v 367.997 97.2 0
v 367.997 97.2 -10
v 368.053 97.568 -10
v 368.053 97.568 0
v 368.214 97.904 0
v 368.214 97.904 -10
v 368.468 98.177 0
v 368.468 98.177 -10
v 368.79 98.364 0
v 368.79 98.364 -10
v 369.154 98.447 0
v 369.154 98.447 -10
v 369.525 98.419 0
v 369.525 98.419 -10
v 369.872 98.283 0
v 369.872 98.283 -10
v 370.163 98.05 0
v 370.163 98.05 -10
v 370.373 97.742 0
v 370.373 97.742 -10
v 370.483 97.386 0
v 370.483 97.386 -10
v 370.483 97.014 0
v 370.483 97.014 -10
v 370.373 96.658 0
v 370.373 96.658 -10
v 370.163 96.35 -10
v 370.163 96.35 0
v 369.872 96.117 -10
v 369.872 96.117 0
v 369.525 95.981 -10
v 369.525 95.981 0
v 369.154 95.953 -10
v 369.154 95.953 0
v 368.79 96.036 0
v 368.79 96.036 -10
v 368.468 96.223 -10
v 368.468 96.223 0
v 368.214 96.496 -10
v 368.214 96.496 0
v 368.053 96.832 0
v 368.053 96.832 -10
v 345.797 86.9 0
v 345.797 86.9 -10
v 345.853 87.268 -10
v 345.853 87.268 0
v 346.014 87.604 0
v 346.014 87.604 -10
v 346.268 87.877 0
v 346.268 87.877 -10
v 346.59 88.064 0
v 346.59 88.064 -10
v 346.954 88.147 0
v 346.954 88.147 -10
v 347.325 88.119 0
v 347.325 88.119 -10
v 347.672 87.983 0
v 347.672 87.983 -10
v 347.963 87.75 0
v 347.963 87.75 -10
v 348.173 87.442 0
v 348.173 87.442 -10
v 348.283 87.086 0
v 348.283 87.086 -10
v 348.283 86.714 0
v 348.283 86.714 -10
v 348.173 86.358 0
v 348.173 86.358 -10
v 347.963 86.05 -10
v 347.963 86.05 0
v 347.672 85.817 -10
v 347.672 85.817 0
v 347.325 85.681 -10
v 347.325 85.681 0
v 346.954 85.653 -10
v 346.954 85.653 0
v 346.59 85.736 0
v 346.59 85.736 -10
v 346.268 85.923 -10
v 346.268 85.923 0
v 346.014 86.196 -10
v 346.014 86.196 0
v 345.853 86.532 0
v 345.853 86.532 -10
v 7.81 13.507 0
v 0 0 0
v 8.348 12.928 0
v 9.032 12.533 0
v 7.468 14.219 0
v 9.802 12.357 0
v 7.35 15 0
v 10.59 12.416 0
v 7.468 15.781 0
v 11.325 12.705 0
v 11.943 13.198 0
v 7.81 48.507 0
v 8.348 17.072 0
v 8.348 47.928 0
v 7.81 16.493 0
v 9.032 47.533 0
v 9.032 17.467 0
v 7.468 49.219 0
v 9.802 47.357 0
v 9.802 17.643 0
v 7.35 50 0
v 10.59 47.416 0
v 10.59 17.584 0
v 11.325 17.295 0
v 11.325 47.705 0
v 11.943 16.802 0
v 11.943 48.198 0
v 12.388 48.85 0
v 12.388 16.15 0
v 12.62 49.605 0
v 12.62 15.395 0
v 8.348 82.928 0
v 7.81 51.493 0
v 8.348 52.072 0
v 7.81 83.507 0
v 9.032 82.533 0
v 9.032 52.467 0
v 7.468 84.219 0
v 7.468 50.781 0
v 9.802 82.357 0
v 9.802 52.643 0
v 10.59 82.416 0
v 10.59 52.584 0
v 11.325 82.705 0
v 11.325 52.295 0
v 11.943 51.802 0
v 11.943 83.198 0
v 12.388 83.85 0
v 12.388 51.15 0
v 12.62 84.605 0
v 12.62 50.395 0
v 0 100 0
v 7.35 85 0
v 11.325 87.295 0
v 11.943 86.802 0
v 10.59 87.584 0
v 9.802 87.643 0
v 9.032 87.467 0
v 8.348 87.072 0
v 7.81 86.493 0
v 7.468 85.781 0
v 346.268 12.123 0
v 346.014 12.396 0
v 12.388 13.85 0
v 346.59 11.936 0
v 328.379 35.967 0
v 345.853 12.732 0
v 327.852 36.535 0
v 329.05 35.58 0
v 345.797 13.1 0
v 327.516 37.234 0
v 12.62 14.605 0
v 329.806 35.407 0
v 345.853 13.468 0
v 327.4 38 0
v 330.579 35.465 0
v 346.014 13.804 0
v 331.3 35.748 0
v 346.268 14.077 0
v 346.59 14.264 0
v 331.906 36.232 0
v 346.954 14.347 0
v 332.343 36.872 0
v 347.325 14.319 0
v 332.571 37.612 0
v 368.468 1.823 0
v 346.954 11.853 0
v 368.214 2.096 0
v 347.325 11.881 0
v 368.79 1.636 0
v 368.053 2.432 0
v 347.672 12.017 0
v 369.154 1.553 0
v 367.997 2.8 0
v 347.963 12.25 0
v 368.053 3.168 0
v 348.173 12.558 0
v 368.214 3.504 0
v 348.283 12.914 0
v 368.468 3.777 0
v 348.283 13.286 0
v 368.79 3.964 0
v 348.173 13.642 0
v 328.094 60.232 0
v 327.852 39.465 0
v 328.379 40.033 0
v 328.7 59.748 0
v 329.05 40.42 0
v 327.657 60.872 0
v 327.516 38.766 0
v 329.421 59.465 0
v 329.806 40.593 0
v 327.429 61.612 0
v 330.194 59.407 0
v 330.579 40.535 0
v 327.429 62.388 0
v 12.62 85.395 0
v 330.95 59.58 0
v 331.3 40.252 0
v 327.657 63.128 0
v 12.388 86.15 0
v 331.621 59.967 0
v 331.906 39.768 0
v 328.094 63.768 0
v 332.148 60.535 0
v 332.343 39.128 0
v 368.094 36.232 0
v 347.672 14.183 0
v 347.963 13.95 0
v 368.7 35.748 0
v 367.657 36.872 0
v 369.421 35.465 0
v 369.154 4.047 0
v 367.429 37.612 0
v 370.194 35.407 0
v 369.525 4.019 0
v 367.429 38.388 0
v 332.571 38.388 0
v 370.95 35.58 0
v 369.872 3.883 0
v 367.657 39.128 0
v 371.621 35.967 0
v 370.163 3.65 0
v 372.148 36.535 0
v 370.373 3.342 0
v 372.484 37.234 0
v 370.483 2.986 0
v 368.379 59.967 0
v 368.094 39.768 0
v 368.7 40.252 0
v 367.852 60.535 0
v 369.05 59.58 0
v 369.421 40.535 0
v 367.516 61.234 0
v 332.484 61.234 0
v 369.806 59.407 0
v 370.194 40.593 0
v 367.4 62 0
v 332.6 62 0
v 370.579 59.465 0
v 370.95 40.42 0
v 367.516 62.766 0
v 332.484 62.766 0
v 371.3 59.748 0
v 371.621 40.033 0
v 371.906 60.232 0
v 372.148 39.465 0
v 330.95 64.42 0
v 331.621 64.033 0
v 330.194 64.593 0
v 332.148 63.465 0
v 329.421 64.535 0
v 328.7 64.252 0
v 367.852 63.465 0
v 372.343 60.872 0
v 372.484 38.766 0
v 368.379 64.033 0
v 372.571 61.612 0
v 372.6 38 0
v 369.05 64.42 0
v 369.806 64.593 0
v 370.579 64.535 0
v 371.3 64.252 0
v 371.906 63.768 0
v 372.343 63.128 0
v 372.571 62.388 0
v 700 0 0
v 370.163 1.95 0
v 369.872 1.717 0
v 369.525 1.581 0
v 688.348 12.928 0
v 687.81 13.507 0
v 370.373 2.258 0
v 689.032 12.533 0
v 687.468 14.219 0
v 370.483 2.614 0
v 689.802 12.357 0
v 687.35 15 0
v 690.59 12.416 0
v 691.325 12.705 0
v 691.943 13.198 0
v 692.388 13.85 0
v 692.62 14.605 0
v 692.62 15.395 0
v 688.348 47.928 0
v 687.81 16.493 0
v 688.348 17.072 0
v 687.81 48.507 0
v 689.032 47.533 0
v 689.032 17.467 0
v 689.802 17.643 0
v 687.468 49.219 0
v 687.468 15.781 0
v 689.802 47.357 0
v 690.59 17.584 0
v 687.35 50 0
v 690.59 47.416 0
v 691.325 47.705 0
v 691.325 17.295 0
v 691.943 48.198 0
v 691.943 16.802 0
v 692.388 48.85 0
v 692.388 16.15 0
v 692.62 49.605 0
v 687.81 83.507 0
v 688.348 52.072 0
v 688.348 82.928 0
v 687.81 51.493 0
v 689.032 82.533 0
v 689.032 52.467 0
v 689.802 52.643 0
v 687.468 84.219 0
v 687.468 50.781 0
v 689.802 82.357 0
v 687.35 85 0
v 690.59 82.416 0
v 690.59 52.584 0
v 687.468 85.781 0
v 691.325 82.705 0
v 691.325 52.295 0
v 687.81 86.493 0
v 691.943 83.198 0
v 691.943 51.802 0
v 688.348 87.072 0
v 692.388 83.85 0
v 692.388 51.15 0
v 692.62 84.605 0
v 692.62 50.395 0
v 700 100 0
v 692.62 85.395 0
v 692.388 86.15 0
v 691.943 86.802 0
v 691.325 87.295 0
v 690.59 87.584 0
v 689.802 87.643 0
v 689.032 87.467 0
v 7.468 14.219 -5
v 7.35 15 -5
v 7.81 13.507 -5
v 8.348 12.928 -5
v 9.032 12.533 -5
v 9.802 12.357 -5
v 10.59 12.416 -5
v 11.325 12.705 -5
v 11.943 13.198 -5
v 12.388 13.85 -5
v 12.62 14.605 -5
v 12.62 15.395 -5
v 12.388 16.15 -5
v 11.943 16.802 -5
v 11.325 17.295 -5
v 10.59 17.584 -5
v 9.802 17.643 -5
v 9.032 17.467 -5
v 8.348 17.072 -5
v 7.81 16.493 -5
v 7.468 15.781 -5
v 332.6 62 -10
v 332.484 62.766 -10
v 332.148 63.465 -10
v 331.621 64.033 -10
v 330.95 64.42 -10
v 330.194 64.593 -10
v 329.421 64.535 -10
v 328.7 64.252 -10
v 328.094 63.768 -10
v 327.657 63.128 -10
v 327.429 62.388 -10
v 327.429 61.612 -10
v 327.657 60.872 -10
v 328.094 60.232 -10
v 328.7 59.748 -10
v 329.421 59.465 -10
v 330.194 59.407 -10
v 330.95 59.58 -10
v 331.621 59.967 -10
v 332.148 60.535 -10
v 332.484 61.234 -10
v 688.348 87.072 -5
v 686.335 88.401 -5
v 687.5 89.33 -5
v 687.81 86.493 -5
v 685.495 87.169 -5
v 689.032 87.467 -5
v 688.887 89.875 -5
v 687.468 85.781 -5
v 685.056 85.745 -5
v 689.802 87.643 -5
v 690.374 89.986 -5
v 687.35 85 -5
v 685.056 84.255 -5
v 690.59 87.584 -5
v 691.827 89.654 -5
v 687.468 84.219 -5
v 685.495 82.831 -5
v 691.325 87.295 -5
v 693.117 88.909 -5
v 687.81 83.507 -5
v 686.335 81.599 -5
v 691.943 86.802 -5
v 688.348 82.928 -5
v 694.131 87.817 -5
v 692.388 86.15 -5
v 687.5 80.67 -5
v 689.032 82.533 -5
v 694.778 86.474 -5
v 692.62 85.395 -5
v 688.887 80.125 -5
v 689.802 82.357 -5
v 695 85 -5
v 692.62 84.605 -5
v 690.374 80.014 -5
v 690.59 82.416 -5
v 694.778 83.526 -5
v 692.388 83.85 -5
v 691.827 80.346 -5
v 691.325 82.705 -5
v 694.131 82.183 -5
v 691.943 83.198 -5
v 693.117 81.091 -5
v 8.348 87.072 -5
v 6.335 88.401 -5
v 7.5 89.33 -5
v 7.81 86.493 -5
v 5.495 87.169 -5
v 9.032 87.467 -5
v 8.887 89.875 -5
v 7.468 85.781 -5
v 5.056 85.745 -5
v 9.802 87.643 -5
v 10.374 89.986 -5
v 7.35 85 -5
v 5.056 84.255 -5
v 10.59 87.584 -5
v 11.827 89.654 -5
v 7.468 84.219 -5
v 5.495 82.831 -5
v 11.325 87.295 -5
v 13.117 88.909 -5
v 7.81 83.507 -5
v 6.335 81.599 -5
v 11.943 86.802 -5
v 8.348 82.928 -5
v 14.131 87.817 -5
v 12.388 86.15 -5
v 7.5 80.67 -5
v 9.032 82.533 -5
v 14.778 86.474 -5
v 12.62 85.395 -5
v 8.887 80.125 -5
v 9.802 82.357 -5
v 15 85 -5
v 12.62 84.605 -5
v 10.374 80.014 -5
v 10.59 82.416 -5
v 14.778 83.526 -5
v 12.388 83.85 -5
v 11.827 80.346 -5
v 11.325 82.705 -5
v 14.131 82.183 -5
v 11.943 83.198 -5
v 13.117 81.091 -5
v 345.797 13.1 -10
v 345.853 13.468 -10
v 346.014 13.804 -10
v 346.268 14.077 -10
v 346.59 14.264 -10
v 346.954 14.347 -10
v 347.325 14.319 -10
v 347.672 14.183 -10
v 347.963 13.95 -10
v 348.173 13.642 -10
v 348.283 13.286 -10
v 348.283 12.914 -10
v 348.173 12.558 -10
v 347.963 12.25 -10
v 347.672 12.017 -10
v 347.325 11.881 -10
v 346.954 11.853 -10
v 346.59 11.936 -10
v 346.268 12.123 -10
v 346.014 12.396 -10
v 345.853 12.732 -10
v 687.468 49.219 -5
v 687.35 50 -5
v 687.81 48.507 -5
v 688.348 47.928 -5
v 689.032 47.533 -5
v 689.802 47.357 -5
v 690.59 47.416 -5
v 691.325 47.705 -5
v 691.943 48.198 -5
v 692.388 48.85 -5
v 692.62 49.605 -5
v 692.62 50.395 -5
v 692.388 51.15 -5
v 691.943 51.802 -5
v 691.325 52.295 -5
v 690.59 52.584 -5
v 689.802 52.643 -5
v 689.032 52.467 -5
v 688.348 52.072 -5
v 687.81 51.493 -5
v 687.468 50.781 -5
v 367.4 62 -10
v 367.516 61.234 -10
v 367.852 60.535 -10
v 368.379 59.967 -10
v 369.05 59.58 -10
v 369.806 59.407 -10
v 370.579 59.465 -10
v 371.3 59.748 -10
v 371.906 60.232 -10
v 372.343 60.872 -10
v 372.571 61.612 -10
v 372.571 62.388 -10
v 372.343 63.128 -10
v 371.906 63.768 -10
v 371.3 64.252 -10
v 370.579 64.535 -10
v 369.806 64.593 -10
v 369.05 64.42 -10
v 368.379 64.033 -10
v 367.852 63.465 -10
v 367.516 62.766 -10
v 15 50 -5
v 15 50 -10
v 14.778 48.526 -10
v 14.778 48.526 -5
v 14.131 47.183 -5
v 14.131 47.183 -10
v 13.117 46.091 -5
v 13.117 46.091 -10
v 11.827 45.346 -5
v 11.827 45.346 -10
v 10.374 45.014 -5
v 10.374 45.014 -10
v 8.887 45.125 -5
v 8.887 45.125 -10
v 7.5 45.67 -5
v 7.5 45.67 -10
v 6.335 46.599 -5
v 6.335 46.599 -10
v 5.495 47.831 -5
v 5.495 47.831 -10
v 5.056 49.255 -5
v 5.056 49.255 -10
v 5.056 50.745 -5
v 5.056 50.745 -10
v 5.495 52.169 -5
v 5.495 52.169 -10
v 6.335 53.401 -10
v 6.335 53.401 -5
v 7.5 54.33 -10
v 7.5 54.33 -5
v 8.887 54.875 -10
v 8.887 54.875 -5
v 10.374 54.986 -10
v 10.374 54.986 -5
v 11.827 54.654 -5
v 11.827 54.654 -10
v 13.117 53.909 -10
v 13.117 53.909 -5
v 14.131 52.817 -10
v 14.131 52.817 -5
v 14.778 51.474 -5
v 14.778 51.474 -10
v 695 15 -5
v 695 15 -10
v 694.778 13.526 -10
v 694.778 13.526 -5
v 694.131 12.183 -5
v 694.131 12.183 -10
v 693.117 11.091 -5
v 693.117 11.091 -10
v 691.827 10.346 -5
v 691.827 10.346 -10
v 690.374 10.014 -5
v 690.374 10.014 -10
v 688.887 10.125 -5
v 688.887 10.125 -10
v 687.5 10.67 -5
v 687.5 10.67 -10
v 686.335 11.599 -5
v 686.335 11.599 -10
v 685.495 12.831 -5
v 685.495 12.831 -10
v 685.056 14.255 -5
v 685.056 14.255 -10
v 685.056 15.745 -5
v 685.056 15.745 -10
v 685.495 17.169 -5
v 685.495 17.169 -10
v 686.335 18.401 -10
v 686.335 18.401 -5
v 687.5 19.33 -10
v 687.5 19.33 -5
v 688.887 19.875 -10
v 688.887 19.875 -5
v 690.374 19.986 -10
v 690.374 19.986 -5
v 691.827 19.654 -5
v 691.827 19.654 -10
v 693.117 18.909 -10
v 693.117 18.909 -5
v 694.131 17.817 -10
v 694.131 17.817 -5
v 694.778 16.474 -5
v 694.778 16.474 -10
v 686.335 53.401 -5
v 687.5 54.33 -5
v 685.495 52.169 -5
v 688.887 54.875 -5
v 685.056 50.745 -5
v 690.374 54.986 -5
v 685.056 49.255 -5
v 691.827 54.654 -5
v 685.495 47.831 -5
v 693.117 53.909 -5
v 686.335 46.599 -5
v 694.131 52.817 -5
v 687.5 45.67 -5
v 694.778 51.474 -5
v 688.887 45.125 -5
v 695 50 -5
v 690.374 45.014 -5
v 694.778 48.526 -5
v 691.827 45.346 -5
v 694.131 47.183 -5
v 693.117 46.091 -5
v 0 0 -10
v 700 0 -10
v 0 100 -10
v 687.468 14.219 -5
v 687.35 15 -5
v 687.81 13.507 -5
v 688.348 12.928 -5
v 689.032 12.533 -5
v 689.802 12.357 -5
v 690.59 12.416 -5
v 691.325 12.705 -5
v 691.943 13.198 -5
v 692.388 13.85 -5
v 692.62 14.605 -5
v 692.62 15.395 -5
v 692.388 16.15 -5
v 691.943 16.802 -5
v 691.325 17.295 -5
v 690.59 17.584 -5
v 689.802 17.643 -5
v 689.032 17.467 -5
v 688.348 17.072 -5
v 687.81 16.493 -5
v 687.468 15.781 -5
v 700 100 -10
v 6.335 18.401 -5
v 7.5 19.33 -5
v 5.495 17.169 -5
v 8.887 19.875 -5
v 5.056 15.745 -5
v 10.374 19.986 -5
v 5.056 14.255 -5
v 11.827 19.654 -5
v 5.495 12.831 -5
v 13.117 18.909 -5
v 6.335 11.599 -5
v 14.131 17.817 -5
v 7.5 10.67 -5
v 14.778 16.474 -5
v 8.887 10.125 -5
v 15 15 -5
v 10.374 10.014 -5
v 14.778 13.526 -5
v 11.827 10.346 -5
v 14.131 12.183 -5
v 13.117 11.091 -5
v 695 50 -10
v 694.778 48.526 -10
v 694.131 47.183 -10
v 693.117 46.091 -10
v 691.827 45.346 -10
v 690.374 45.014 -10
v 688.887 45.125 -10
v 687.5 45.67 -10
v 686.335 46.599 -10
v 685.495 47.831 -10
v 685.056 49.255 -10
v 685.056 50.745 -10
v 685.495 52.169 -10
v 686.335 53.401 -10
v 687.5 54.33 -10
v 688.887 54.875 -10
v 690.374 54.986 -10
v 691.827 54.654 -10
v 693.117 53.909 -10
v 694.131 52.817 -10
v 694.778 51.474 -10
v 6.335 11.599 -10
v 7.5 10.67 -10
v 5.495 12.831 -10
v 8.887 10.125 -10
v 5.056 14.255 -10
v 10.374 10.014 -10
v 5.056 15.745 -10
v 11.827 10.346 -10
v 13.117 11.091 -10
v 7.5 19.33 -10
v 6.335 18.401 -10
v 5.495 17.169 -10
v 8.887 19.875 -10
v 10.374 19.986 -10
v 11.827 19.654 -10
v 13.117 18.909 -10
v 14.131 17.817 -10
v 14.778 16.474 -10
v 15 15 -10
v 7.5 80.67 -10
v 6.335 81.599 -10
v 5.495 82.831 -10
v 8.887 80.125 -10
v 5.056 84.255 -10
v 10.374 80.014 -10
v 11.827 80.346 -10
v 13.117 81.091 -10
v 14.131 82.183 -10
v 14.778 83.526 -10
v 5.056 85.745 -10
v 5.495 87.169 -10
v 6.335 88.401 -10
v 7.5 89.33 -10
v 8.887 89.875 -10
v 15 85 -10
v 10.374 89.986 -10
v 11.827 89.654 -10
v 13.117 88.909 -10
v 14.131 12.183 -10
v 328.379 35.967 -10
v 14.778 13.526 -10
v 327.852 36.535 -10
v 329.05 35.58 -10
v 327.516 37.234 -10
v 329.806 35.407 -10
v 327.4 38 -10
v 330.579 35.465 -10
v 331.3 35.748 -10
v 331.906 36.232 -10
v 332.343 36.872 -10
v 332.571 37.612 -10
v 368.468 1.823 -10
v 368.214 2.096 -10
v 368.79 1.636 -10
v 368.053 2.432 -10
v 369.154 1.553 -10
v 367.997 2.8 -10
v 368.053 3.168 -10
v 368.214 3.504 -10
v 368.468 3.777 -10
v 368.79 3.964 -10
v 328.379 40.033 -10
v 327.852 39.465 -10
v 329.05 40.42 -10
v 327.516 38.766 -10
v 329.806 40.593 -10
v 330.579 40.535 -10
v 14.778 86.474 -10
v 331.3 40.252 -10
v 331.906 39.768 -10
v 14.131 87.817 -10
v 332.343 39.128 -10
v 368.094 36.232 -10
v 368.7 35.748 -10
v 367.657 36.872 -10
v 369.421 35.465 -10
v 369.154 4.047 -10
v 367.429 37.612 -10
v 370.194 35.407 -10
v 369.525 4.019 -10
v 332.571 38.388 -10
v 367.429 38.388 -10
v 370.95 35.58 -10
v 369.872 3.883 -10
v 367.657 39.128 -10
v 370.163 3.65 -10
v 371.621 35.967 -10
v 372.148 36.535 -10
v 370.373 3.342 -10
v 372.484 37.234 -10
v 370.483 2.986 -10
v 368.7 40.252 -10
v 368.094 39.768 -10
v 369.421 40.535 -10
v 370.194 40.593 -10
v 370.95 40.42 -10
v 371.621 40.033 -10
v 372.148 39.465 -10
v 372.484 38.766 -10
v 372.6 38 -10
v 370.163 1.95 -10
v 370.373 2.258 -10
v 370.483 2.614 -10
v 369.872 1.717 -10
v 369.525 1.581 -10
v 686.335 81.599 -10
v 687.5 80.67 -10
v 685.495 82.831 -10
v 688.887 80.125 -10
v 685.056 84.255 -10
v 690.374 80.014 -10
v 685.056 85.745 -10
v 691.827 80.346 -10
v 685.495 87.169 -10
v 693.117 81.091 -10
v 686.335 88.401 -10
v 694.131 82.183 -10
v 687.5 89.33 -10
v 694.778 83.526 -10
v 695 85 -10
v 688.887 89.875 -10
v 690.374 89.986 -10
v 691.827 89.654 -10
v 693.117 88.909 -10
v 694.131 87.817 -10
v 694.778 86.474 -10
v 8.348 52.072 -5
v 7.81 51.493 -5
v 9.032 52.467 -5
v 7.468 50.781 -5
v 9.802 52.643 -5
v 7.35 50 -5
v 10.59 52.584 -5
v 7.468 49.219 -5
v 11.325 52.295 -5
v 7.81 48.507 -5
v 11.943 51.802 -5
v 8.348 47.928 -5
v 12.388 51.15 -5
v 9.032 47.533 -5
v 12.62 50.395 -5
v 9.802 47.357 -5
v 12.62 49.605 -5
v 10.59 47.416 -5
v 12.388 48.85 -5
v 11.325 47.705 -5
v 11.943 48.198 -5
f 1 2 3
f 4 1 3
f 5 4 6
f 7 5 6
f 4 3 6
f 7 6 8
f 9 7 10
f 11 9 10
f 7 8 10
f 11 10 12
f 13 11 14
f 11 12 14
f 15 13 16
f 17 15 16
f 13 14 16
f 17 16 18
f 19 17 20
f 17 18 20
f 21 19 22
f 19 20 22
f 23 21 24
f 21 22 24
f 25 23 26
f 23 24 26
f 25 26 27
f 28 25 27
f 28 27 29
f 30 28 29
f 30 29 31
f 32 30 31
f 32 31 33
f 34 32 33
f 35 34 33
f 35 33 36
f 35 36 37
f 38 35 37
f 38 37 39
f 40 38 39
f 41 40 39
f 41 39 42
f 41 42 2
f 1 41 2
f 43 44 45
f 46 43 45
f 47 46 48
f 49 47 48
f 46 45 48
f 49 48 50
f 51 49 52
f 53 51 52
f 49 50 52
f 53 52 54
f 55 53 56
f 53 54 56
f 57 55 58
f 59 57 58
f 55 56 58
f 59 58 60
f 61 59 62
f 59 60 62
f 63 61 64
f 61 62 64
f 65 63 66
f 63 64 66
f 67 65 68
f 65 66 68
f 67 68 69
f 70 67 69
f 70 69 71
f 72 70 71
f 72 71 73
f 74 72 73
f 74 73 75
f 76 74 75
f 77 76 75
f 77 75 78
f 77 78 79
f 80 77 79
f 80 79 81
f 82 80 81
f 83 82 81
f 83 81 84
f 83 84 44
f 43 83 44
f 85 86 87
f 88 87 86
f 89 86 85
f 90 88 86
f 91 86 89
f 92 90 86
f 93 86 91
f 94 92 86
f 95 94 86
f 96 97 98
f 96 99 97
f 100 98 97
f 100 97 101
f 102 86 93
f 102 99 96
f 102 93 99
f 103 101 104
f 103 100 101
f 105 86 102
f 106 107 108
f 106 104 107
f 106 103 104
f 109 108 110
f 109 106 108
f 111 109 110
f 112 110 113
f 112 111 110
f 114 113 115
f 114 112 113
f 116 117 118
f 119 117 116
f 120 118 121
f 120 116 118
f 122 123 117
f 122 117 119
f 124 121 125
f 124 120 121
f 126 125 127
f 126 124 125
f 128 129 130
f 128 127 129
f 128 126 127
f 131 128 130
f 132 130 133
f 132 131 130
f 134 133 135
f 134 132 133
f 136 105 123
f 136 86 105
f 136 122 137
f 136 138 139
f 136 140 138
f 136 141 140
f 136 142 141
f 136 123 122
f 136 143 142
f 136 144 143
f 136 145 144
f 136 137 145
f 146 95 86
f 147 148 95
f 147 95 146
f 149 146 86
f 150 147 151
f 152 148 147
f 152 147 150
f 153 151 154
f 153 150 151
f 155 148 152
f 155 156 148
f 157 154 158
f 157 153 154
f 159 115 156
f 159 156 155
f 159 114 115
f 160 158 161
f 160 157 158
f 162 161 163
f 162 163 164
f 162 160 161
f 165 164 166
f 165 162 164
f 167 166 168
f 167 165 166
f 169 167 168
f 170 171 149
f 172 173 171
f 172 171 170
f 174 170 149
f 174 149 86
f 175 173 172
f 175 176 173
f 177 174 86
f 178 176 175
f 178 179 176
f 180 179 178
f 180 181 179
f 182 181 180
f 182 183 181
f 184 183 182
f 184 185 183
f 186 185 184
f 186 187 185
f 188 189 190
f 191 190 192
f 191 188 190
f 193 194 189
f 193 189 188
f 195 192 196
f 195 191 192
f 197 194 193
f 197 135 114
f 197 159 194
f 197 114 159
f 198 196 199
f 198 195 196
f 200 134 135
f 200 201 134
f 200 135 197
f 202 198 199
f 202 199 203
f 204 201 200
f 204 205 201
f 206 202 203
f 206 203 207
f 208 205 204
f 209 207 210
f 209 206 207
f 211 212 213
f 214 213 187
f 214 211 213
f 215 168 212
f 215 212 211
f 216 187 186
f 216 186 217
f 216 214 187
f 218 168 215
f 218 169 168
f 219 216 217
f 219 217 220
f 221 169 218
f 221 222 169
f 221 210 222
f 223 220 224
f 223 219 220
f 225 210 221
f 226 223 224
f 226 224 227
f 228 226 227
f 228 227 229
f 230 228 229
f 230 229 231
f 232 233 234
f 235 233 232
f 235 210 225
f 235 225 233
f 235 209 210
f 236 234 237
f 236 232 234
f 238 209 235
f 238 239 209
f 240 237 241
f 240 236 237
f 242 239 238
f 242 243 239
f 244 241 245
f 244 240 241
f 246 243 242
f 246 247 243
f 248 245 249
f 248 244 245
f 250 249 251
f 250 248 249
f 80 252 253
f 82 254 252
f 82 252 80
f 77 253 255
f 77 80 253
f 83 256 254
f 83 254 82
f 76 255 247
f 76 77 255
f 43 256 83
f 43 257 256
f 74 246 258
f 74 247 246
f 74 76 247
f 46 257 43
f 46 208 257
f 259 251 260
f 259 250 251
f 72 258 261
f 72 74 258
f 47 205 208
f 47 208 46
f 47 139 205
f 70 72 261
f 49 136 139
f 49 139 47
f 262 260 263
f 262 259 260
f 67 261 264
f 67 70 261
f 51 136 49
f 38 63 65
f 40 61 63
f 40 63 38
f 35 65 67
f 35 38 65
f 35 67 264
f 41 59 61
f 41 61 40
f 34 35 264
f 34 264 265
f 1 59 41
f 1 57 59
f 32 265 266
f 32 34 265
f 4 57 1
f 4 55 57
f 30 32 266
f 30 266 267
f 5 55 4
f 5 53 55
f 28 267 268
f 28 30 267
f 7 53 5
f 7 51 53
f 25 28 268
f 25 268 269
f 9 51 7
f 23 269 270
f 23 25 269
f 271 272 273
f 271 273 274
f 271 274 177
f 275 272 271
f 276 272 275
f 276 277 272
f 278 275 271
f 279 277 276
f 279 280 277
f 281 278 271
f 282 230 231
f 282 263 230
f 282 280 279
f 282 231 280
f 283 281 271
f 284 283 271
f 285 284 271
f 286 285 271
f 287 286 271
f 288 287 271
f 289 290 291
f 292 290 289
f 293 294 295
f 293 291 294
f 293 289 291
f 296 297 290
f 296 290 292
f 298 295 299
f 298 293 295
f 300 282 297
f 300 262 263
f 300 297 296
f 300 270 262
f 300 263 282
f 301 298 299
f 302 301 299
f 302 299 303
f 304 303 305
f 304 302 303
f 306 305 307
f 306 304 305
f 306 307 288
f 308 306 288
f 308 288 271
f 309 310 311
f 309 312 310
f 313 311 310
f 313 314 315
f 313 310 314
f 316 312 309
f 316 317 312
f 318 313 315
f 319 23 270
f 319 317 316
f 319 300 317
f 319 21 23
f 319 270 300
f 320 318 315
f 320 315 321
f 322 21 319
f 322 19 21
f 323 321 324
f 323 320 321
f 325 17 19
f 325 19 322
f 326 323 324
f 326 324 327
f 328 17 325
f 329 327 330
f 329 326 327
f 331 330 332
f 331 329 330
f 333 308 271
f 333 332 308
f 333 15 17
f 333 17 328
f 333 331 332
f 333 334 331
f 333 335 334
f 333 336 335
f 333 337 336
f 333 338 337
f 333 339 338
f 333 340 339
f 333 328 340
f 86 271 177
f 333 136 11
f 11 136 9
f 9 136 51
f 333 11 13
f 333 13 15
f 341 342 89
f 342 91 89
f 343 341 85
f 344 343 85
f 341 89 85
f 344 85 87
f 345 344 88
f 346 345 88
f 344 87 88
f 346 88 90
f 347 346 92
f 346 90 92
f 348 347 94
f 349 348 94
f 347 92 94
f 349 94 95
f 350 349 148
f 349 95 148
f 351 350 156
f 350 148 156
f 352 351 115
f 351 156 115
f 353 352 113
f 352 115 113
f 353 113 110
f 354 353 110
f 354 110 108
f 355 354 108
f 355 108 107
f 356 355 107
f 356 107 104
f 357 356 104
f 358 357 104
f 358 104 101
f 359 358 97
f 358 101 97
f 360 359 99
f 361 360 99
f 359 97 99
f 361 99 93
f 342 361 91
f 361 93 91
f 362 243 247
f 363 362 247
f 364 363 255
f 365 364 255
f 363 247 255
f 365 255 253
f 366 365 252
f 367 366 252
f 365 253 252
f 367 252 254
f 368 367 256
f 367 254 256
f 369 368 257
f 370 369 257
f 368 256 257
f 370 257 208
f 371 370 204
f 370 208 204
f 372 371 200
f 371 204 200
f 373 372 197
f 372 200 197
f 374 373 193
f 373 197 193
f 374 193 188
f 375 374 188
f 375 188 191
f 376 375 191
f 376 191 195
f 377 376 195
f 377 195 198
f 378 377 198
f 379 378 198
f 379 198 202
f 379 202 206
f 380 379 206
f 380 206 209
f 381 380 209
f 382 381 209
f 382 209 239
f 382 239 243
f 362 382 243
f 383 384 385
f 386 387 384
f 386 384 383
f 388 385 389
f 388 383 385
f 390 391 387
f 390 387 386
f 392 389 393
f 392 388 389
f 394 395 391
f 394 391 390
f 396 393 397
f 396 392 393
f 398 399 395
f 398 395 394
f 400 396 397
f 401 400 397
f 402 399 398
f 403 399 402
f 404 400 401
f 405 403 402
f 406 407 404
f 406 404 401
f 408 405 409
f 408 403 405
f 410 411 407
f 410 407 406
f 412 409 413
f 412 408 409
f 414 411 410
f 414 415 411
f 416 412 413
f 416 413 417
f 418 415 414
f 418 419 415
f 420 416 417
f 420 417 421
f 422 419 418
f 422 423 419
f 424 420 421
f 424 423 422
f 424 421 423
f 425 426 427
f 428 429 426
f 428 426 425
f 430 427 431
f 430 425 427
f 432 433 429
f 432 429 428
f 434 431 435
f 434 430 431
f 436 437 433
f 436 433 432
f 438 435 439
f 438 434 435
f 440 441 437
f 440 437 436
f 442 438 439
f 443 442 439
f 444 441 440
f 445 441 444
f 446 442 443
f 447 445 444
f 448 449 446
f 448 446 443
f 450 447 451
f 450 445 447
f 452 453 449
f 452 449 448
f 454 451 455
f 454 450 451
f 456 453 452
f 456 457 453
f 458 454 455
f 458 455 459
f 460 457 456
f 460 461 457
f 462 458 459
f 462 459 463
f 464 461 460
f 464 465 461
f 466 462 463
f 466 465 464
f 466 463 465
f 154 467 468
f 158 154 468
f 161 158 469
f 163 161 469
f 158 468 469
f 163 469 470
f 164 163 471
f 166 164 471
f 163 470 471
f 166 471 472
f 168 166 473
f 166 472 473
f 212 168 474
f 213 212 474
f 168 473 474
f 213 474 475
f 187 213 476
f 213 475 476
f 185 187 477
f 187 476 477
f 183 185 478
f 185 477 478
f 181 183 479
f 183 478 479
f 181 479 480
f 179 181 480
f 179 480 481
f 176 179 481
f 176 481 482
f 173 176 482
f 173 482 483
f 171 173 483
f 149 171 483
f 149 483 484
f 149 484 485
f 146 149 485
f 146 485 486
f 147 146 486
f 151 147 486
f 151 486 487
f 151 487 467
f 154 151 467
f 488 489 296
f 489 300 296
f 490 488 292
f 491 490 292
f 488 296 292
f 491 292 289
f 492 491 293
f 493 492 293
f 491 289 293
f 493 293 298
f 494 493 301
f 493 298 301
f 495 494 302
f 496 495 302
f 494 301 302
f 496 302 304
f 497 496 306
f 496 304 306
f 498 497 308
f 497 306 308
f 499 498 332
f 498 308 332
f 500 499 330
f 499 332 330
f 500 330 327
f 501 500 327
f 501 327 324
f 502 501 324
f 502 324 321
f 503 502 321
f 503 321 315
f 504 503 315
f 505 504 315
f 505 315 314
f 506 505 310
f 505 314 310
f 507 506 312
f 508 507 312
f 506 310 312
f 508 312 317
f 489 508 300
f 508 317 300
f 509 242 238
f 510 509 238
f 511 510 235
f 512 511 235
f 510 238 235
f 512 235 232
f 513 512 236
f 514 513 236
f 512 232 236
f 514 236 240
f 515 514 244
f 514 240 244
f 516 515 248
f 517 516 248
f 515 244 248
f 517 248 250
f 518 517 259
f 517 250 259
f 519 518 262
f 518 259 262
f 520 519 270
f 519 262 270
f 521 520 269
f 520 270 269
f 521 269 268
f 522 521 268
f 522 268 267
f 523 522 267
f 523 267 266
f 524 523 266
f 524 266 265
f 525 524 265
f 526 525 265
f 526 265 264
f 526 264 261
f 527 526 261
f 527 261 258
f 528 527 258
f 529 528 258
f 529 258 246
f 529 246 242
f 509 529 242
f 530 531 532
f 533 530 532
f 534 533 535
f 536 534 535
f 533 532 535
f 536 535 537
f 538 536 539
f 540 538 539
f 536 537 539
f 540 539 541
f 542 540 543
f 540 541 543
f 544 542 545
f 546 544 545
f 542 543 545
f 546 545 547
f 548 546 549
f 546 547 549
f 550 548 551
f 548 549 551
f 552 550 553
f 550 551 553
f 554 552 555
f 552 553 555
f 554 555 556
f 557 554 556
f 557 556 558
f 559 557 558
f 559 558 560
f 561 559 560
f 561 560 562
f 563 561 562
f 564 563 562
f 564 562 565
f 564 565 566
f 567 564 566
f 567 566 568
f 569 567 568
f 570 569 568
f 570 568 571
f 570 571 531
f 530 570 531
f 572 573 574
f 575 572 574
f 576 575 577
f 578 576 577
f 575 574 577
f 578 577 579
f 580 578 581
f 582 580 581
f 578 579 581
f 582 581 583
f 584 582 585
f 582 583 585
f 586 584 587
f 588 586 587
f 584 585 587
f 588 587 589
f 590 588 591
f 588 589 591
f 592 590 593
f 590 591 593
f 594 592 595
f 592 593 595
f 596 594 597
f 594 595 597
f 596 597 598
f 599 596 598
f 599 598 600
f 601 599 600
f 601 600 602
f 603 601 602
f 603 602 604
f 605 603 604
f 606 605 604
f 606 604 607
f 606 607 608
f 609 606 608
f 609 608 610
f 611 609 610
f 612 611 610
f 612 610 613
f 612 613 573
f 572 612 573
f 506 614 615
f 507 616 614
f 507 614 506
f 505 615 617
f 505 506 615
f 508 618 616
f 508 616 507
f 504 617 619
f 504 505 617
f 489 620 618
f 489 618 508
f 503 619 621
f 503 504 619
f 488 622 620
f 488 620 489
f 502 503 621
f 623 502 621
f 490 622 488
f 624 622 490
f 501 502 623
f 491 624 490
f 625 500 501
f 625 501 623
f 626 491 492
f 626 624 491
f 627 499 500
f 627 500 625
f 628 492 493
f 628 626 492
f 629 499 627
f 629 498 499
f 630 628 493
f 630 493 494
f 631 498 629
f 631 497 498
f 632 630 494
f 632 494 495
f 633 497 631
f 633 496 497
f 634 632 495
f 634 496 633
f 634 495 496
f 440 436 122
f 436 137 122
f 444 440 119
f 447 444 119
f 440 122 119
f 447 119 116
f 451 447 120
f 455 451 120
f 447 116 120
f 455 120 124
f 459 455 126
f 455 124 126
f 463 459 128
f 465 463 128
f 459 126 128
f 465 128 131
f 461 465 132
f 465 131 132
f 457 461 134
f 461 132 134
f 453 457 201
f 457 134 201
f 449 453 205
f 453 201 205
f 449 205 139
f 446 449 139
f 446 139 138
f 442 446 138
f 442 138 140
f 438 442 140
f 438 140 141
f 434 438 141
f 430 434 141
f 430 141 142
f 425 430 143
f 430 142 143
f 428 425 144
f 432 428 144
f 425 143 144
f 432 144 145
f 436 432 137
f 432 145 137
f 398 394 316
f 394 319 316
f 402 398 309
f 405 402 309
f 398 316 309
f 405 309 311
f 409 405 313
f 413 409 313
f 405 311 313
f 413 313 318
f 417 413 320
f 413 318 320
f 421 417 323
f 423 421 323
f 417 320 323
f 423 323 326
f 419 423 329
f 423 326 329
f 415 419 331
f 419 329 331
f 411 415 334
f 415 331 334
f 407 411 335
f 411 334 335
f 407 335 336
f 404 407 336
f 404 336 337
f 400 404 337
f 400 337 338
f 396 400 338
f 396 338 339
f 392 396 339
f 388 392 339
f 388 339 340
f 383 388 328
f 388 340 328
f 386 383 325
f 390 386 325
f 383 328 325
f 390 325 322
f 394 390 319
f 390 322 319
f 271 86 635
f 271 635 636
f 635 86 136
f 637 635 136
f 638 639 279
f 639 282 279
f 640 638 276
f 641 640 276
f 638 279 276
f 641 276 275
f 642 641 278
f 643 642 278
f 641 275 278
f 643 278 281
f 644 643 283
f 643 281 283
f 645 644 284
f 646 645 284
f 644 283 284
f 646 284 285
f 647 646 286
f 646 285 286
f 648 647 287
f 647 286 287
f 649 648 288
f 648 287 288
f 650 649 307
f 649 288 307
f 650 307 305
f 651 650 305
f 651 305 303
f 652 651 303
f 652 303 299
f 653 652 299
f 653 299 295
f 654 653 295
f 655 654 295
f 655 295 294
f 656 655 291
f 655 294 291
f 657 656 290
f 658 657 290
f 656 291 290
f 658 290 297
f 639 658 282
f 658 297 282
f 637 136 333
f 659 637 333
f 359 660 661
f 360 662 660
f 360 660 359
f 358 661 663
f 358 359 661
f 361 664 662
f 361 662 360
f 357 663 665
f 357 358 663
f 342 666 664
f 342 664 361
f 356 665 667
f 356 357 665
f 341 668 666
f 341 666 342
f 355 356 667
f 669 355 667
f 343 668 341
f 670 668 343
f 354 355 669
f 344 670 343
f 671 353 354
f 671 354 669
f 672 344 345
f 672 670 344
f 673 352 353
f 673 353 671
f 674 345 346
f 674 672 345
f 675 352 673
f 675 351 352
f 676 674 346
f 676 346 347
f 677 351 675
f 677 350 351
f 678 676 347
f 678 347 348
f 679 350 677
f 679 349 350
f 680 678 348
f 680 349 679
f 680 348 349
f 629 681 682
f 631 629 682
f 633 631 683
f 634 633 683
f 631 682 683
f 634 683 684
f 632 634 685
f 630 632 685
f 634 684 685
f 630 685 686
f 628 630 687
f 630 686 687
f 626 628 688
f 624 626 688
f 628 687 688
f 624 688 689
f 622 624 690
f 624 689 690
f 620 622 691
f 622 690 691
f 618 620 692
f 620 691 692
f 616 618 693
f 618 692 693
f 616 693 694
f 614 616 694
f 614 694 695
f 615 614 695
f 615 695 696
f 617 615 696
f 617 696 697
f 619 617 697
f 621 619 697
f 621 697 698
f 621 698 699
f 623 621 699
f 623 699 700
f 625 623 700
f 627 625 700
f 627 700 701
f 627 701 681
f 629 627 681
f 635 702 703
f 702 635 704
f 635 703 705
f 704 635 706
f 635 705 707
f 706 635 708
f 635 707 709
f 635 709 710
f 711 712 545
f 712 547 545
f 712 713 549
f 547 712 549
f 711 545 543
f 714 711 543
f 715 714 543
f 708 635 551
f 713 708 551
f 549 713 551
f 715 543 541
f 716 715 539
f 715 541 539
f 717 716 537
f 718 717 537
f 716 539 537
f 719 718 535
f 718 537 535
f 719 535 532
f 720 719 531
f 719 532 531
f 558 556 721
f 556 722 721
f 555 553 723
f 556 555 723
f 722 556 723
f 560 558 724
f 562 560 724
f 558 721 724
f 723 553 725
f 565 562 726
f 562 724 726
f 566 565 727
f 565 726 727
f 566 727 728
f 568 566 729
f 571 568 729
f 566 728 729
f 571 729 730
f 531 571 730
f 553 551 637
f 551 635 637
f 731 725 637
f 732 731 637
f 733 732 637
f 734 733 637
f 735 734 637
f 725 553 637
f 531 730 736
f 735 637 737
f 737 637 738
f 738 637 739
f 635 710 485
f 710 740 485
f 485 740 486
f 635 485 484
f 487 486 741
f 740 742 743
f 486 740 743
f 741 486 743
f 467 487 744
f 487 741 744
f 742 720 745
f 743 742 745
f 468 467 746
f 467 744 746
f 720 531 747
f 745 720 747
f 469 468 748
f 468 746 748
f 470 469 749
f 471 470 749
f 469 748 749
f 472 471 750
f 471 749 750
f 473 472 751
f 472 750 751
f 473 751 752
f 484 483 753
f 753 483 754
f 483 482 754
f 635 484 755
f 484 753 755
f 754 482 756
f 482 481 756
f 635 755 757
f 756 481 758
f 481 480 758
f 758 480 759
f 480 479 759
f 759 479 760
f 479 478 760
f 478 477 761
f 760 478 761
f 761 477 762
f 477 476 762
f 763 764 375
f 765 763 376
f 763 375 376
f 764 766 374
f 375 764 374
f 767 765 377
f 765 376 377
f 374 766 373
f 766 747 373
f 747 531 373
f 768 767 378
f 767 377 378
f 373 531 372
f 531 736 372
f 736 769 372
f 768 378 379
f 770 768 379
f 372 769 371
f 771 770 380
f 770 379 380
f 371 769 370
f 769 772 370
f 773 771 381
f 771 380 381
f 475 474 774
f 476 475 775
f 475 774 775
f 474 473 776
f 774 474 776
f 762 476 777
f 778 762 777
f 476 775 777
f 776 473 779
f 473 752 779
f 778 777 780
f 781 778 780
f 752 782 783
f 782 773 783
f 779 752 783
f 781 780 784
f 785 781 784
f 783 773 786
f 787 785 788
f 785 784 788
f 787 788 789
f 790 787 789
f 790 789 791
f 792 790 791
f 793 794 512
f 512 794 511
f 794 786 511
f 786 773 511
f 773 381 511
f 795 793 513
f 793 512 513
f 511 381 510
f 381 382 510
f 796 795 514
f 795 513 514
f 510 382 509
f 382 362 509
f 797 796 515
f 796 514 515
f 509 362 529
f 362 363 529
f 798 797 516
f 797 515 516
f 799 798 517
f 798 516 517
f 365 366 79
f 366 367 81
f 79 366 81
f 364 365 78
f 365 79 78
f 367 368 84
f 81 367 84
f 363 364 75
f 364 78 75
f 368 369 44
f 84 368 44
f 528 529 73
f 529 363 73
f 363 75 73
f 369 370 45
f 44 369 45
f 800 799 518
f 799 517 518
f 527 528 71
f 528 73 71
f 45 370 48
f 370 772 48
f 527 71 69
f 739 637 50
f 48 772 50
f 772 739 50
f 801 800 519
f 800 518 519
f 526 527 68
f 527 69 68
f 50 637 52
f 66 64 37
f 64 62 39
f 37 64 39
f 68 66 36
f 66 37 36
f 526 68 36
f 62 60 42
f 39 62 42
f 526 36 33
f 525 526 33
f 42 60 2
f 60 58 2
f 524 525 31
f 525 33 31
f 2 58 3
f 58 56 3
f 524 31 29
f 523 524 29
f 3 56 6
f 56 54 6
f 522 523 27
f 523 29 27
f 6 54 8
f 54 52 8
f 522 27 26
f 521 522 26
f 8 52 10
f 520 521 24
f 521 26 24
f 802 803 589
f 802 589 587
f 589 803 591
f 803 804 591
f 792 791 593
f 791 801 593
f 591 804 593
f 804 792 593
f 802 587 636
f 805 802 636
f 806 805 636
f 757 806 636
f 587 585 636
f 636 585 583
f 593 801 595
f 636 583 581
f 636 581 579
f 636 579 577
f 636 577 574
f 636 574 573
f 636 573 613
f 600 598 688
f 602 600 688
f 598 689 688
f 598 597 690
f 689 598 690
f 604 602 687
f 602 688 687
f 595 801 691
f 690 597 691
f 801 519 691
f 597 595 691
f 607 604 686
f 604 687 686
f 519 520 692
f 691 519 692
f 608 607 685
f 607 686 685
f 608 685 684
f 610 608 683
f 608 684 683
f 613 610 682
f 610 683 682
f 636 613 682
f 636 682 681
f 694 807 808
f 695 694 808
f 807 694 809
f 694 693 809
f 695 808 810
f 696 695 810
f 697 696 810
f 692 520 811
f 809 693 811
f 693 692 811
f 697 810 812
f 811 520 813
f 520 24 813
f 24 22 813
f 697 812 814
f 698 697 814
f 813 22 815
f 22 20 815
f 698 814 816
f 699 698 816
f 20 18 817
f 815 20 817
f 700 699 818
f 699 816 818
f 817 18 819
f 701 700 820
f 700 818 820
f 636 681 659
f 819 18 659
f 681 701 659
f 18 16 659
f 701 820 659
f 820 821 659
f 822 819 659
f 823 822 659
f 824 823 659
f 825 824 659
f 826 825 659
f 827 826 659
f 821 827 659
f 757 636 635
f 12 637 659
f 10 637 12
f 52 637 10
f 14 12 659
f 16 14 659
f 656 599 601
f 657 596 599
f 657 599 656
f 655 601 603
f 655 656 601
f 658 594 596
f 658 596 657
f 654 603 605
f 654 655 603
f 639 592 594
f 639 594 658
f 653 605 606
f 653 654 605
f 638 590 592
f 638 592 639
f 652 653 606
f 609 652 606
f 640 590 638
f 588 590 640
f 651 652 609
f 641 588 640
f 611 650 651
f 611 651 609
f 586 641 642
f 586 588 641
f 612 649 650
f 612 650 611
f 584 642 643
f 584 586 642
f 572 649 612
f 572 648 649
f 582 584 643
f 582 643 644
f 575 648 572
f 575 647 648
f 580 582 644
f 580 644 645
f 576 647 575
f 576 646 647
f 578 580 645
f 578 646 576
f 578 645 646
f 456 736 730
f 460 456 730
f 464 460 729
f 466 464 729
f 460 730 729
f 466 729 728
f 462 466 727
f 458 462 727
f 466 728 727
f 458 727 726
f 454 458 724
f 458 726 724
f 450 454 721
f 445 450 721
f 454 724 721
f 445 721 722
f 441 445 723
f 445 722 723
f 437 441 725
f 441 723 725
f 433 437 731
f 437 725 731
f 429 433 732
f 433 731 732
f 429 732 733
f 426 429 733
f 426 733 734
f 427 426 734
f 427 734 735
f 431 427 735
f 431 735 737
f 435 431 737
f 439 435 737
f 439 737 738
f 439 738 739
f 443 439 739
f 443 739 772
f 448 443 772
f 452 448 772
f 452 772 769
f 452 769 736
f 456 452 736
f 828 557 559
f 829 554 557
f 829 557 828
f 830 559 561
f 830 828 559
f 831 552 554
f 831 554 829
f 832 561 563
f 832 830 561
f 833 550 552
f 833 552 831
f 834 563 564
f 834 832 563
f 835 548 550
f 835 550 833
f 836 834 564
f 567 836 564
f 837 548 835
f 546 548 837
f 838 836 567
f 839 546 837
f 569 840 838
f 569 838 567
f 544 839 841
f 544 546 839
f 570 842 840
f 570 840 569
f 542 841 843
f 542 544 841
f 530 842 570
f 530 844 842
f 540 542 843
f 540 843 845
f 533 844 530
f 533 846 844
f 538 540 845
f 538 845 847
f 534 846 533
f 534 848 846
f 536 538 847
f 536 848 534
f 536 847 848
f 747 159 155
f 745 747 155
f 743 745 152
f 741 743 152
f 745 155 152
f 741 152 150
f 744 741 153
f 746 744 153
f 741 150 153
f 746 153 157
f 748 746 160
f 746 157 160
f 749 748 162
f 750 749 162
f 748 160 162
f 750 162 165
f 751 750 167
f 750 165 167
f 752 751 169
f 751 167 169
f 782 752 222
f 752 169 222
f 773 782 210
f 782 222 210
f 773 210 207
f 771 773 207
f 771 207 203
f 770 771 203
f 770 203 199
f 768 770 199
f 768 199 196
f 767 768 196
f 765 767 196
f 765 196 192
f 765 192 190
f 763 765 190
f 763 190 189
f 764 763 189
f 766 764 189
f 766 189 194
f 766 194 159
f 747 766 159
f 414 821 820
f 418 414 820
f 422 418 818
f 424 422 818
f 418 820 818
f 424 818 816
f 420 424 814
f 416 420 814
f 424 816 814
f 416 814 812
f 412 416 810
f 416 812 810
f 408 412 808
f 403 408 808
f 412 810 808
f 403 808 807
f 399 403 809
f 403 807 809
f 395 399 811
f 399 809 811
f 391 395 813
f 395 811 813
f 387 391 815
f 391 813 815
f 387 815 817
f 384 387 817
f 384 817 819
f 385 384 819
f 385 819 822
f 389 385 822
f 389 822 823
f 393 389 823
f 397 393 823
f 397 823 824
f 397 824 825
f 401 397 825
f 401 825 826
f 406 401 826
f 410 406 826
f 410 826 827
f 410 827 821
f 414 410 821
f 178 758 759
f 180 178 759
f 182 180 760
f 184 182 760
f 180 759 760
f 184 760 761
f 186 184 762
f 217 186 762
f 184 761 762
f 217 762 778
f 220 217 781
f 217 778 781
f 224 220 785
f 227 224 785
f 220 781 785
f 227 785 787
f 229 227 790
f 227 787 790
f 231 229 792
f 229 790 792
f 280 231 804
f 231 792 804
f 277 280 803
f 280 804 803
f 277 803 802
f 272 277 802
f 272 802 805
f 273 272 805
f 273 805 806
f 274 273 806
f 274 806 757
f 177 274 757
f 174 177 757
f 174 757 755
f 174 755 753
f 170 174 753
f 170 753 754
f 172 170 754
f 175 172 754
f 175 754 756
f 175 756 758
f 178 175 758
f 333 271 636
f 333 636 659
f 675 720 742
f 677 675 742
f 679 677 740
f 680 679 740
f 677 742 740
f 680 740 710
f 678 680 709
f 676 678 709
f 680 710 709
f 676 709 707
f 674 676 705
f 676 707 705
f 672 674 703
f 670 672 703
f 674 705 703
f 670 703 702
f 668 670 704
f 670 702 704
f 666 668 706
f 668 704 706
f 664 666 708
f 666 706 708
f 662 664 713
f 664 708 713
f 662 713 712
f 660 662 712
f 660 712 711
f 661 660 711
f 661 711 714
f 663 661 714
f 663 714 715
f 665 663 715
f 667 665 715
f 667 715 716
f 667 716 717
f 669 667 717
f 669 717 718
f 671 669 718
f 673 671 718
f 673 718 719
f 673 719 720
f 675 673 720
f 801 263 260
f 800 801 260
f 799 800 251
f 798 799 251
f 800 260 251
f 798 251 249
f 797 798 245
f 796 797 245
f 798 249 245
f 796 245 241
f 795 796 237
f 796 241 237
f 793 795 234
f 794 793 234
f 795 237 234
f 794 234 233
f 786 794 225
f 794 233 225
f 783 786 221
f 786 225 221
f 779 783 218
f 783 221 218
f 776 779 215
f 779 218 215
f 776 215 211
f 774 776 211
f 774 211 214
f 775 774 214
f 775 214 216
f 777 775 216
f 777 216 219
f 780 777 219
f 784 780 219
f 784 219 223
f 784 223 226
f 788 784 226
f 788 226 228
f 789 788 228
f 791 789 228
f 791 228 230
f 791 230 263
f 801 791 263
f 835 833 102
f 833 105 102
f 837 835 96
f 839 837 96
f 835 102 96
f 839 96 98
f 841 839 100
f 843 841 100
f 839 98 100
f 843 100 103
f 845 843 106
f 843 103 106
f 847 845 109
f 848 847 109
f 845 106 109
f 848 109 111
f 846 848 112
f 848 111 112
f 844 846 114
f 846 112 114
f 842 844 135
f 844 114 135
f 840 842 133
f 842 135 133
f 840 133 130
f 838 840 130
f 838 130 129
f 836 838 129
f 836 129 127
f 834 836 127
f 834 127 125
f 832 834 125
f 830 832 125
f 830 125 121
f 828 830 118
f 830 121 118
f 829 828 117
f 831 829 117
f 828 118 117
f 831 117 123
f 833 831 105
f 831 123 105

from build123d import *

# Parameters (mm, degrees)
SCHIZZO1_W                     = 700
SCHIZZO1_H                     = 100
ESTRUSIONE_ESTRUSIONE1_DEPTH   = 10
SCHIZZO2_R                     = 2.6
TAGLIO_ESTRUSIONE1_DEPTH       = 708.177488329
M3_TAPPED_HOLE1_D              = 2.5
M3_TAPPED_HOLE1_DEPTH          = 11.5
M3_TAPPED_HOLE1_TIP            = 0.751075774
CBORE_FOR_M5_SHCS1_D           = 5.3
CBORE_FOR_M5_SHCS1_CBORE_D     = 10
CBORE_FOR_M5_SHCS1_CBORE_DEPTH = 5


with BuildPart() as part:
    # Schizzo1 → Estrusione-Estrusione1 (new body)
    with BuildSketch(Plane.XY):
        with Locations((350, 50)):
            Rectangle(SCHIZZO1_W, SCHIZZO1_H)
    extrude(amount=-ESTRUSIONE_ESTRUSIONE1_DEPTH)

    # Schizzo2 → Taglio-Estrusione1 (cut, through all)
    with BuildSketch(Plane.XY):
        with Locations((330, 62)):
            Circle(SCHIZZO2_R)
        with Locations(Location((370, 62, 0), (0, 0, 180))):
            Circle(SCHIZZO2_R)
        with Locations((370, 38)):
            Circle(SCHIZZO2_R)
        with Locations(Location((330, 38, 0), (0, 0, 180))):
            Circle(SCHIZZO2_R)
    extrude(amount=-TAGLIO_ESTRUSIONE1_DEPTH, mode=Mode.SUBTRACT)

    # M3 Tapped Hole1
    with Locations(Plane(origin=(369.247113875, 97.2, 0), x_dir=(1, 0, 0), z_dir=(0, 0, 1))):
        with Locations((0, 0), (-22.2, -10.3), (-22.2, -84.1), (0, -94.4)):
            Hole(M3_TAPPED_HOLE1_D / 2, depth=M3_TAPPED_HOLE1_DEPTH)
            with Locations((0, 0, -(M3_TAPPED_HOLE1_DEPTH + M3_TAPPED_HOLE1_TIP / 2))):  # 118° drill point
                Cone(0, M3_TAPPED_HOLE1_D / 2, M3_TAPPED_HOLE1_TIP, mode=Mode.SUBTRACT)

    # CBORE for M5 SHCS1 (through all)
    with Locations(Plane(origin=(0, 0, -10), x_dir=(1, 0, 0), z_dir=(0, 0, -1))):
        with Locations((10, -85), (10, -50), (10, -15), (690, -85), (690, -50), (690, -15)):
            CounterBoreHole(CBORE_FOR_M5_SHCS1_D / 2, CBORE_FOR_M5_SHCS1_CBORE_D / 2, CBORE_FOR_M5_SHCS1_CBORE_DEPTH)


solid = part.part
